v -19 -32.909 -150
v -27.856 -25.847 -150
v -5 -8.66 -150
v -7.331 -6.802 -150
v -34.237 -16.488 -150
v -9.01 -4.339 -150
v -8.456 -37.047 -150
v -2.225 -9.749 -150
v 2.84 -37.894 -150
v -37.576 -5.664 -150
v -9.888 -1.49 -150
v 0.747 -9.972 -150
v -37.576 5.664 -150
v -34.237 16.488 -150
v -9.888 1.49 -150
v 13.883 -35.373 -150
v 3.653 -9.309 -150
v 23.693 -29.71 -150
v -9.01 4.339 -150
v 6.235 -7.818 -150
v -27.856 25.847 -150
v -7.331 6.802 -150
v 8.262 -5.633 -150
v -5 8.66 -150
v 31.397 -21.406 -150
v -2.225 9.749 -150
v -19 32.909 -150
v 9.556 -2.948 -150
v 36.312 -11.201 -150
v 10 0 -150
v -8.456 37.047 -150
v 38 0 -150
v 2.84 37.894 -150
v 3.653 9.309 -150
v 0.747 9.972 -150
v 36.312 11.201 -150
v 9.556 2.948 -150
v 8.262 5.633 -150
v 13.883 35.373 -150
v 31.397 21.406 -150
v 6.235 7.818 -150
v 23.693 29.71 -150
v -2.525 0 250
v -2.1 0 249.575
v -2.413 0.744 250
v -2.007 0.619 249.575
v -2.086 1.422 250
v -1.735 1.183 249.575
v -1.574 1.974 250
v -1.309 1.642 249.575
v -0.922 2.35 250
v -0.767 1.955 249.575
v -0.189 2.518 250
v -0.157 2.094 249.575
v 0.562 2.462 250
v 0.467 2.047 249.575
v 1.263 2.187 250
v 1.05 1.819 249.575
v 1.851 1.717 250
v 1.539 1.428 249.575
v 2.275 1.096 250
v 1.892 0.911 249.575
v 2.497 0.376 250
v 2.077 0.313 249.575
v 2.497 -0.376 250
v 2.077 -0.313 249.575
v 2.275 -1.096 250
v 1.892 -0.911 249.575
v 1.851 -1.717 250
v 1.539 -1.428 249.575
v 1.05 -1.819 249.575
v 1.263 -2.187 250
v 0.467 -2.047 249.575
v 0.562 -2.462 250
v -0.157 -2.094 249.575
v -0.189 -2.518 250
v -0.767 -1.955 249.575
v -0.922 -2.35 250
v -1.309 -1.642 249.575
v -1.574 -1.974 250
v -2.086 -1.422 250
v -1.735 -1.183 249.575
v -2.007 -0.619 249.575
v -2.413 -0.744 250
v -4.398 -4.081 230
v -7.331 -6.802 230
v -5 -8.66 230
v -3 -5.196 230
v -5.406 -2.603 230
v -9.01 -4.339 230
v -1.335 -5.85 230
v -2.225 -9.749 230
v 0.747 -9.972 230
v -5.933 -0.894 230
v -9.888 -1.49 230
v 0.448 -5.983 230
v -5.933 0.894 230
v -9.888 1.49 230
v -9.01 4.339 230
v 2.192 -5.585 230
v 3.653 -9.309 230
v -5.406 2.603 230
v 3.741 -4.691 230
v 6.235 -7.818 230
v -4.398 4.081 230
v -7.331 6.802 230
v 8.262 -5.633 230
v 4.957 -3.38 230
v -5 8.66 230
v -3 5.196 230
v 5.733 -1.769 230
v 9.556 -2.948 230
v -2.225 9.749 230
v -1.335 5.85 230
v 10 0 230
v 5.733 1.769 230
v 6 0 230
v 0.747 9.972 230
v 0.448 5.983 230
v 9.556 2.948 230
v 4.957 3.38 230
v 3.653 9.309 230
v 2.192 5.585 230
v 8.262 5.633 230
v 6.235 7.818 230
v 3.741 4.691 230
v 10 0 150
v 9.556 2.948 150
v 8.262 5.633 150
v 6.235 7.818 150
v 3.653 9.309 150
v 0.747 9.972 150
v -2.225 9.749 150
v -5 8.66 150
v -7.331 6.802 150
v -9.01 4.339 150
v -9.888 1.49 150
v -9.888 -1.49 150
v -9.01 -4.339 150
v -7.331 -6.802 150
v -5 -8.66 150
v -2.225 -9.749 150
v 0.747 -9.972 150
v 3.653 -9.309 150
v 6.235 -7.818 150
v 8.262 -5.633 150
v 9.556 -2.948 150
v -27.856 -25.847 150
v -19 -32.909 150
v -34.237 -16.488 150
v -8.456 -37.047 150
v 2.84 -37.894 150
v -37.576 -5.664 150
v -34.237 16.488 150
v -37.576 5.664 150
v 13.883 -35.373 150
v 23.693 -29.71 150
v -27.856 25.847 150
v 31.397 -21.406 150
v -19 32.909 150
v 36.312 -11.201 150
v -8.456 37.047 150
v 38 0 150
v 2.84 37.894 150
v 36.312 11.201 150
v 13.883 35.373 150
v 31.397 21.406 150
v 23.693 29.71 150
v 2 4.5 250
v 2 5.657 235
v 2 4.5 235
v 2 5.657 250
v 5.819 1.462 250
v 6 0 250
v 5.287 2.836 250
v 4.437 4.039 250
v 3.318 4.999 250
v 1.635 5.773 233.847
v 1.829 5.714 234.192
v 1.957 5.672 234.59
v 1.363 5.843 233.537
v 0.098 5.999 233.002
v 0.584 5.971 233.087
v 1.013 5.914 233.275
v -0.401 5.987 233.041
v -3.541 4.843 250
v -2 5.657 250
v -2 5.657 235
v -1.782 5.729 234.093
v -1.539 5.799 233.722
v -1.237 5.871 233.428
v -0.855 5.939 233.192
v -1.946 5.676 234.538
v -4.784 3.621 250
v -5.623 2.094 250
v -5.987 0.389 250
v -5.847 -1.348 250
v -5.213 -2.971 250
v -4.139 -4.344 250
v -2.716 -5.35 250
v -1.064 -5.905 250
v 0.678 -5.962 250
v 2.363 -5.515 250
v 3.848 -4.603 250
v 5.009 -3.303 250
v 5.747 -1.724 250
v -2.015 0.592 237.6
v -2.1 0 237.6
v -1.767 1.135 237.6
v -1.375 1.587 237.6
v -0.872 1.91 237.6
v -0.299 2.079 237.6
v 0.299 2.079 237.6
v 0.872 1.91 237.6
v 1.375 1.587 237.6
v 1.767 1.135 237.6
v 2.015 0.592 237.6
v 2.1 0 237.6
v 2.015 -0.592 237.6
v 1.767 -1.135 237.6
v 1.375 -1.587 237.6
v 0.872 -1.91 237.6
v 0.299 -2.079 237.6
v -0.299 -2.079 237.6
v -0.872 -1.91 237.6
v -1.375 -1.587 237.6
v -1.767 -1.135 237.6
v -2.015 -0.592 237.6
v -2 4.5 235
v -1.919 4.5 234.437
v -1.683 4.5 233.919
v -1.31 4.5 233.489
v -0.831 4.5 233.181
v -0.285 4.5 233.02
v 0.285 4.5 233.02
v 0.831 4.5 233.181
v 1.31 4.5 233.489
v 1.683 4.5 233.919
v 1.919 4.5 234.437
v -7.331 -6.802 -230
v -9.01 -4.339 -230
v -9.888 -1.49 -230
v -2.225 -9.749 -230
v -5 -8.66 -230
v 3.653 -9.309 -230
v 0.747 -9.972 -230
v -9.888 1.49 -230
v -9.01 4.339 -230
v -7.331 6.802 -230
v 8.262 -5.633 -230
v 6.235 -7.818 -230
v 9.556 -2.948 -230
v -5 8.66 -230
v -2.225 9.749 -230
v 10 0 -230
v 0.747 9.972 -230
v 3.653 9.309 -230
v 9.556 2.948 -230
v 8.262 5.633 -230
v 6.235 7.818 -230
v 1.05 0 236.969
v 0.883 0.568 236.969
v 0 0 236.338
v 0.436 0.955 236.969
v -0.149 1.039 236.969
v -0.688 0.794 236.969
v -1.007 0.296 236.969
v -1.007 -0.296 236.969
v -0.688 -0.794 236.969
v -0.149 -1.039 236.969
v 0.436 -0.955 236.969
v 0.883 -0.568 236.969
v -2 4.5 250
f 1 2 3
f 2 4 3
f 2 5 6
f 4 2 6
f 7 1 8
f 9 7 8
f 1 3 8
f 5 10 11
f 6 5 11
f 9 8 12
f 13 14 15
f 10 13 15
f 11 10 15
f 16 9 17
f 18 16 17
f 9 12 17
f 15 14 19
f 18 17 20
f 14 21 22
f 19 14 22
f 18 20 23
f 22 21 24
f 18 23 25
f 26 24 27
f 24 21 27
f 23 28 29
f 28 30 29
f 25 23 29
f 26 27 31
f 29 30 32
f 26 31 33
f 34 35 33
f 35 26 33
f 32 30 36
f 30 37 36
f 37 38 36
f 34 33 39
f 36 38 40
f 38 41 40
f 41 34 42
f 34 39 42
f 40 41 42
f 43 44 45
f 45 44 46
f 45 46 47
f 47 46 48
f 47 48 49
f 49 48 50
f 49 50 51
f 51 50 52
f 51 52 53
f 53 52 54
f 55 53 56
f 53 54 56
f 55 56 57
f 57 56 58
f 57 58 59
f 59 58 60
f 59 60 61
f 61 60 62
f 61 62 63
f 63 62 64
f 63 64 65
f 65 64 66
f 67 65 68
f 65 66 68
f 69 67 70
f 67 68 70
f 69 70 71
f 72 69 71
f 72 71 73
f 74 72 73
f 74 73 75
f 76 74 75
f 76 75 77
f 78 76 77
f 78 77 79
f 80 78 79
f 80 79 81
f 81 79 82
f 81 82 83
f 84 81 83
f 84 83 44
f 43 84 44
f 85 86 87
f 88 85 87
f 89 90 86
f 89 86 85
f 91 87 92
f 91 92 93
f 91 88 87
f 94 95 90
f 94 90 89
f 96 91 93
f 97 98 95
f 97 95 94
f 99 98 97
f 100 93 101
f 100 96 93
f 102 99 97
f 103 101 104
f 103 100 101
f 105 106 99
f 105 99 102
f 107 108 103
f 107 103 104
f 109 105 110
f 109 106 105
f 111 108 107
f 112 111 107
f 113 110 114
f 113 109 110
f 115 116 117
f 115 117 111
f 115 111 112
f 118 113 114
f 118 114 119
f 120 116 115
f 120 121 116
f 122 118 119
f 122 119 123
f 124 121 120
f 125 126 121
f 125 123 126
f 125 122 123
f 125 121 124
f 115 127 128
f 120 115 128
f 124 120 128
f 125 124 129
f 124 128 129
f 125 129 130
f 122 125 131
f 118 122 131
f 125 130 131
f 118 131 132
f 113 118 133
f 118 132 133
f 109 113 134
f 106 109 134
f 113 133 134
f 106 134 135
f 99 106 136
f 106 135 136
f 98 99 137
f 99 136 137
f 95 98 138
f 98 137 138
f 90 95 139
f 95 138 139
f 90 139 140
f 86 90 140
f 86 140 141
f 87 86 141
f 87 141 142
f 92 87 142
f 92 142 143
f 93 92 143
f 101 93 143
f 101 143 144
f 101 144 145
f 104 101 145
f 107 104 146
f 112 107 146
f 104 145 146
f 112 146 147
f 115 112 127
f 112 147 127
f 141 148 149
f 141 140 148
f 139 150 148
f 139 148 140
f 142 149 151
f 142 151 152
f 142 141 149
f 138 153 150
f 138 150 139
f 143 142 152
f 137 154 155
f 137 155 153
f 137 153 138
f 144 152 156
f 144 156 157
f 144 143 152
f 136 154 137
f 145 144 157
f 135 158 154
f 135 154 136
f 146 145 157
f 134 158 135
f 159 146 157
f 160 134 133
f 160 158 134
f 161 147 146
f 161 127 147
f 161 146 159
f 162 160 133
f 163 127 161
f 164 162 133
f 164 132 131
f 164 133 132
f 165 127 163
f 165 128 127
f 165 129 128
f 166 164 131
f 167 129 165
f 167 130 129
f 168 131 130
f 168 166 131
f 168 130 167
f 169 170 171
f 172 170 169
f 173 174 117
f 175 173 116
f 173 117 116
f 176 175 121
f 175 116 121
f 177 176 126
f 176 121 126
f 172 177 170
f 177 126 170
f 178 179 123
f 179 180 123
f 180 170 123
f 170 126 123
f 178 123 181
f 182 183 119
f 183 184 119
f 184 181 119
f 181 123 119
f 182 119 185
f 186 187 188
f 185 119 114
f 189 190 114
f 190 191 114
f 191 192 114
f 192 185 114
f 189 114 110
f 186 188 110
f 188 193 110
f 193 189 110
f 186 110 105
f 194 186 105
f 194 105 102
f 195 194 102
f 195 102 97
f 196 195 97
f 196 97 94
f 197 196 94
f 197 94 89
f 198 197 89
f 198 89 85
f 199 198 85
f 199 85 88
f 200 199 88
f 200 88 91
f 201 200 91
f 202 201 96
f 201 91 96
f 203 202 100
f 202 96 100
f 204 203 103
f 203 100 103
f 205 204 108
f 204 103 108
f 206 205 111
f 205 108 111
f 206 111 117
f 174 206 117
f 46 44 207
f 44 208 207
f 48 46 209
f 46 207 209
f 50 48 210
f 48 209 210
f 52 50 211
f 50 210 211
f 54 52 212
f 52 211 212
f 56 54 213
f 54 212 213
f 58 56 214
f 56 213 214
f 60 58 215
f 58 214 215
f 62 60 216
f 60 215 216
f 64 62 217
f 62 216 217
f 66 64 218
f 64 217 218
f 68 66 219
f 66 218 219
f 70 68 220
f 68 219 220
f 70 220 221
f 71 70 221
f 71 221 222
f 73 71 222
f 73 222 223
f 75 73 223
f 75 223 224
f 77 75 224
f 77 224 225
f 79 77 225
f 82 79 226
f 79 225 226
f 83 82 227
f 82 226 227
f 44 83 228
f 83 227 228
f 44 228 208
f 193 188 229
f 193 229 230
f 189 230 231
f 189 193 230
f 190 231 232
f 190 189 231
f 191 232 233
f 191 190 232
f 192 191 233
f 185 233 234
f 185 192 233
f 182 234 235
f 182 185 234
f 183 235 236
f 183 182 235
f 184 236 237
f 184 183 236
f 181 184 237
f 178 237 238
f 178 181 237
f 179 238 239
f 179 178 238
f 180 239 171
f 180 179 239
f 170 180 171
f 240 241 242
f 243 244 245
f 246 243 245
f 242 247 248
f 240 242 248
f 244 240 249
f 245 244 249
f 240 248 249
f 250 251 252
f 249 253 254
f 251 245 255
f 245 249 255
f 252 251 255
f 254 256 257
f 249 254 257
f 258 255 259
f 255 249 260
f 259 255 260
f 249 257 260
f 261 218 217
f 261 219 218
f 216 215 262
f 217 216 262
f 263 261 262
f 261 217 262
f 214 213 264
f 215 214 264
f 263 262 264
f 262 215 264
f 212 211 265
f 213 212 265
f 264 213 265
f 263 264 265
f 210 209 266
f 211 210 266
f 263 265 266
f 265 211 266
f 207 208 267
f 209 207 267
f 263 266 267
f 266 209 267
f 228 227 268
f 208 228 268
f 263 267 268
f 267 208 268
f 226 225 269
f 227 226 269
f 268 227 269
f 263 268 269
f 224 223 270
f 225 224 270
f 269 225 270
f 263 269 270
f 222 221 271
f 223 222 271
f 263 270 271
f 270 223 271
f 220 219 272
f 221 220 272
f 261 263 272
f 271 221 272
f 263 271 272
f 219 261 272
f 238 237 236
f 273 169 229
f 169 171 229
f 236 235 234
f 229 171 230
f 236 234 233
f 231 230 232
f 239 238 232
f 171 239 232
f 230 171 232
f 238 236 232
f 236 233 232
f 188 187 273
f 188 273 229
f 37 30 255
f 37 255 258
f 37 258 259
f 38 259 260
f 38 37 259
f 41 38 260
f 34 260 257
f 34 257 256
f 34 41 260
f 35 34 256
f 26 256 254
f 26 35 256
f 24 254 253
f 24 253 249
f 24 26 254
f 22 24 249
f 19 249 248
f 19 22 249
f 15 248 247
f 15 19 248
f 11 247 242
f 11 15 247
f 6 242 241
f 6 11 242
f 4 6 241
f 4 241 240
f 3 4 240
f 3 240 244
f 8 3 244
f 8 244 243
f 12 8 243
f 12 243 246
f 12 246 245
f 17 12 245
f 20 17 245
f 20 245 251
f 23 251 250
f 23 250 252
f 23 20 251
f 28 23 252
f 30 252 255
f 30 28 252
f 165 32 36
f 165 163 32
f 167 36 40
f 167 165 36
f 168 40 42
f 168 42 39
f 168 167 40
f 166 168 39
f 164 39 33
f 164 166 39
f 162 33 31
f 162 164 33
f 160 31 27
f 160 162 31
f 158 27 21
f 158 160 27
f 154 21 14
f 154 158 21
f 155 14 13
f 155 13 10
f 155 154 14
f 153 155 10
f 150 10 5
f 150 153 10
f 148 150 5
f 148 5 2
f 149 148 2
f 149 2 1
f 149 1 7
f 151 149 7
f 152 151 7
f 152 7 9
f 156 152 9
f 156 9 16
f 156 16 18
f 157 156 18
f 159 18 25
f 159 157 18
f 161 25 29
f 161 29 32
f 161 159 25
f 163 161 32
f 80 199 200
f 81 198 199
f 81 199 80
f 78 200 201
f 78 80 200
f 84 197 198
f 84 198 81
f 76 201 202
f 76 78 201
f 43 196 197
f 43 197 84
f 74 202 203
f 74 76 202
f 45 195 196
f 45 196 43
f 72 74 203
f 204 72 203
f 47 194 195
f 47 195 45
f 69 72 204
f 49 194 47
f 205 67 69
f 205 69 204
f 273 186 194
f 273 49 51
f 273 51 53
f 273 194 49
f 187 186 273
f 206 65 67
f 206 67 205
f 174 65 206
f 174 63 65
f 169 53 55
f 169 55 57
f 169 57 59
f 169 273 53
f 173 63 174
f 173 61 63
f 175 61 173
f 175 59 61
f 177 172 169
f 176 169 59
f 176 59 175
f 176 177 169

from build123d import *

# Parameters (mm, degrees)
SKETCH_1_R                   = 38
EXTRUDE_1_DEPTH              = 150
SKETCH_2_R                   = 10
EXTRUDE_2_DEPTH              = 80
SKETCH_3_R                   = 6
EXTRUDE_3_DEPTH              = 20
CUT_EXTRUDE_START            = 7.5
CUT_EXTRUDE_1_DEPTH          = 3
HOLE_WIZARD_M5_1_D           = 4.2
HOLE_WIZARD_M5_1_DEPTH       = 12.4
HOLE_WIZARD_M5_1_CSINK_D     = 5.05
HOLE_WIZARD_M5_1_CSINK_ANGLE = 90
HOLE_WIZARD_M5_1_TIP         = 1.2618073


with BuildPart() as part:
    # 草图1 → 凸台-拉伸1 (new, symmetric)
    with BuildSketch(Plane.XY):
        Circle(SKETCH_1_R)
    extrude(amount=EXTRUDE_1_DEPTH, both=True)

    # 草图2 → 凸台-拉伸2 (add)
    with BuildSketch(Plane.XY.offset(150)):
        Circle(SKETCH_2_R)
    extrude_2 = extrude(amount=EXTRUDE_2_DEPTH)

    # 镜向1: 凸台-拉伸2 across plane
    add(extrude_2.mirror(Plane.XY))

    # 草图3 → 凸台-拉伸3 (add)
    with BuildSketch(Plane.XY.offset(230)):
        Circle(SKETCH_3_R)
    extrude(amount=EXTRUDE_3_DEPTH)

    # 草图4 → 切除-拉伸1 (cut)
    with BuildSketch(Plane(origin=(0, 0, 0), x_dir=(1, 0, 0), z_dir=(0, 1, 0)).offset(CUT_EXTRUDE_START)):
        with BuildLine():
            Line((-2, -250), (-2, -235))
            ThreePointArc((-2, -235), (0, -233), (2, -235))
            Line((2, -235), (2, -250))
            ThreePointArc((2, -250), (0, -252), (-2, -250))
        make_face()
    extrude(amount=-CUT_EXTRUDE_1_DEPTH, mode=Mode.SUBTRACT)

    # M5 螺纹孔1
    with Locations(Plane.XY.offset(250)):
        with Locations((0, 0)):
            CounterSinkHole(HOLE_WIZARD_M5_1_D / 2, HOLE_WIZARD_M5_1_CSINK_D / 2, depth=HOLE_WIZARD_M5_1_DEPTH, counter_sink_angle=HOLE_WIZARD_M5_1_CSINK_ANGLE)
            with Locations((0, 0, -(HOLE_WIZARD_M5_1_DEPTH + HOLE_WIZARD_M5_1_TIP / 2))):  # 118° drill point
                Cone(0, HOLE_WIZARD_M5_1_D / 2, HOLE_WIZARD_M5_1_TIP, mode=Mode.SUBTRACT)


solid = part.part
